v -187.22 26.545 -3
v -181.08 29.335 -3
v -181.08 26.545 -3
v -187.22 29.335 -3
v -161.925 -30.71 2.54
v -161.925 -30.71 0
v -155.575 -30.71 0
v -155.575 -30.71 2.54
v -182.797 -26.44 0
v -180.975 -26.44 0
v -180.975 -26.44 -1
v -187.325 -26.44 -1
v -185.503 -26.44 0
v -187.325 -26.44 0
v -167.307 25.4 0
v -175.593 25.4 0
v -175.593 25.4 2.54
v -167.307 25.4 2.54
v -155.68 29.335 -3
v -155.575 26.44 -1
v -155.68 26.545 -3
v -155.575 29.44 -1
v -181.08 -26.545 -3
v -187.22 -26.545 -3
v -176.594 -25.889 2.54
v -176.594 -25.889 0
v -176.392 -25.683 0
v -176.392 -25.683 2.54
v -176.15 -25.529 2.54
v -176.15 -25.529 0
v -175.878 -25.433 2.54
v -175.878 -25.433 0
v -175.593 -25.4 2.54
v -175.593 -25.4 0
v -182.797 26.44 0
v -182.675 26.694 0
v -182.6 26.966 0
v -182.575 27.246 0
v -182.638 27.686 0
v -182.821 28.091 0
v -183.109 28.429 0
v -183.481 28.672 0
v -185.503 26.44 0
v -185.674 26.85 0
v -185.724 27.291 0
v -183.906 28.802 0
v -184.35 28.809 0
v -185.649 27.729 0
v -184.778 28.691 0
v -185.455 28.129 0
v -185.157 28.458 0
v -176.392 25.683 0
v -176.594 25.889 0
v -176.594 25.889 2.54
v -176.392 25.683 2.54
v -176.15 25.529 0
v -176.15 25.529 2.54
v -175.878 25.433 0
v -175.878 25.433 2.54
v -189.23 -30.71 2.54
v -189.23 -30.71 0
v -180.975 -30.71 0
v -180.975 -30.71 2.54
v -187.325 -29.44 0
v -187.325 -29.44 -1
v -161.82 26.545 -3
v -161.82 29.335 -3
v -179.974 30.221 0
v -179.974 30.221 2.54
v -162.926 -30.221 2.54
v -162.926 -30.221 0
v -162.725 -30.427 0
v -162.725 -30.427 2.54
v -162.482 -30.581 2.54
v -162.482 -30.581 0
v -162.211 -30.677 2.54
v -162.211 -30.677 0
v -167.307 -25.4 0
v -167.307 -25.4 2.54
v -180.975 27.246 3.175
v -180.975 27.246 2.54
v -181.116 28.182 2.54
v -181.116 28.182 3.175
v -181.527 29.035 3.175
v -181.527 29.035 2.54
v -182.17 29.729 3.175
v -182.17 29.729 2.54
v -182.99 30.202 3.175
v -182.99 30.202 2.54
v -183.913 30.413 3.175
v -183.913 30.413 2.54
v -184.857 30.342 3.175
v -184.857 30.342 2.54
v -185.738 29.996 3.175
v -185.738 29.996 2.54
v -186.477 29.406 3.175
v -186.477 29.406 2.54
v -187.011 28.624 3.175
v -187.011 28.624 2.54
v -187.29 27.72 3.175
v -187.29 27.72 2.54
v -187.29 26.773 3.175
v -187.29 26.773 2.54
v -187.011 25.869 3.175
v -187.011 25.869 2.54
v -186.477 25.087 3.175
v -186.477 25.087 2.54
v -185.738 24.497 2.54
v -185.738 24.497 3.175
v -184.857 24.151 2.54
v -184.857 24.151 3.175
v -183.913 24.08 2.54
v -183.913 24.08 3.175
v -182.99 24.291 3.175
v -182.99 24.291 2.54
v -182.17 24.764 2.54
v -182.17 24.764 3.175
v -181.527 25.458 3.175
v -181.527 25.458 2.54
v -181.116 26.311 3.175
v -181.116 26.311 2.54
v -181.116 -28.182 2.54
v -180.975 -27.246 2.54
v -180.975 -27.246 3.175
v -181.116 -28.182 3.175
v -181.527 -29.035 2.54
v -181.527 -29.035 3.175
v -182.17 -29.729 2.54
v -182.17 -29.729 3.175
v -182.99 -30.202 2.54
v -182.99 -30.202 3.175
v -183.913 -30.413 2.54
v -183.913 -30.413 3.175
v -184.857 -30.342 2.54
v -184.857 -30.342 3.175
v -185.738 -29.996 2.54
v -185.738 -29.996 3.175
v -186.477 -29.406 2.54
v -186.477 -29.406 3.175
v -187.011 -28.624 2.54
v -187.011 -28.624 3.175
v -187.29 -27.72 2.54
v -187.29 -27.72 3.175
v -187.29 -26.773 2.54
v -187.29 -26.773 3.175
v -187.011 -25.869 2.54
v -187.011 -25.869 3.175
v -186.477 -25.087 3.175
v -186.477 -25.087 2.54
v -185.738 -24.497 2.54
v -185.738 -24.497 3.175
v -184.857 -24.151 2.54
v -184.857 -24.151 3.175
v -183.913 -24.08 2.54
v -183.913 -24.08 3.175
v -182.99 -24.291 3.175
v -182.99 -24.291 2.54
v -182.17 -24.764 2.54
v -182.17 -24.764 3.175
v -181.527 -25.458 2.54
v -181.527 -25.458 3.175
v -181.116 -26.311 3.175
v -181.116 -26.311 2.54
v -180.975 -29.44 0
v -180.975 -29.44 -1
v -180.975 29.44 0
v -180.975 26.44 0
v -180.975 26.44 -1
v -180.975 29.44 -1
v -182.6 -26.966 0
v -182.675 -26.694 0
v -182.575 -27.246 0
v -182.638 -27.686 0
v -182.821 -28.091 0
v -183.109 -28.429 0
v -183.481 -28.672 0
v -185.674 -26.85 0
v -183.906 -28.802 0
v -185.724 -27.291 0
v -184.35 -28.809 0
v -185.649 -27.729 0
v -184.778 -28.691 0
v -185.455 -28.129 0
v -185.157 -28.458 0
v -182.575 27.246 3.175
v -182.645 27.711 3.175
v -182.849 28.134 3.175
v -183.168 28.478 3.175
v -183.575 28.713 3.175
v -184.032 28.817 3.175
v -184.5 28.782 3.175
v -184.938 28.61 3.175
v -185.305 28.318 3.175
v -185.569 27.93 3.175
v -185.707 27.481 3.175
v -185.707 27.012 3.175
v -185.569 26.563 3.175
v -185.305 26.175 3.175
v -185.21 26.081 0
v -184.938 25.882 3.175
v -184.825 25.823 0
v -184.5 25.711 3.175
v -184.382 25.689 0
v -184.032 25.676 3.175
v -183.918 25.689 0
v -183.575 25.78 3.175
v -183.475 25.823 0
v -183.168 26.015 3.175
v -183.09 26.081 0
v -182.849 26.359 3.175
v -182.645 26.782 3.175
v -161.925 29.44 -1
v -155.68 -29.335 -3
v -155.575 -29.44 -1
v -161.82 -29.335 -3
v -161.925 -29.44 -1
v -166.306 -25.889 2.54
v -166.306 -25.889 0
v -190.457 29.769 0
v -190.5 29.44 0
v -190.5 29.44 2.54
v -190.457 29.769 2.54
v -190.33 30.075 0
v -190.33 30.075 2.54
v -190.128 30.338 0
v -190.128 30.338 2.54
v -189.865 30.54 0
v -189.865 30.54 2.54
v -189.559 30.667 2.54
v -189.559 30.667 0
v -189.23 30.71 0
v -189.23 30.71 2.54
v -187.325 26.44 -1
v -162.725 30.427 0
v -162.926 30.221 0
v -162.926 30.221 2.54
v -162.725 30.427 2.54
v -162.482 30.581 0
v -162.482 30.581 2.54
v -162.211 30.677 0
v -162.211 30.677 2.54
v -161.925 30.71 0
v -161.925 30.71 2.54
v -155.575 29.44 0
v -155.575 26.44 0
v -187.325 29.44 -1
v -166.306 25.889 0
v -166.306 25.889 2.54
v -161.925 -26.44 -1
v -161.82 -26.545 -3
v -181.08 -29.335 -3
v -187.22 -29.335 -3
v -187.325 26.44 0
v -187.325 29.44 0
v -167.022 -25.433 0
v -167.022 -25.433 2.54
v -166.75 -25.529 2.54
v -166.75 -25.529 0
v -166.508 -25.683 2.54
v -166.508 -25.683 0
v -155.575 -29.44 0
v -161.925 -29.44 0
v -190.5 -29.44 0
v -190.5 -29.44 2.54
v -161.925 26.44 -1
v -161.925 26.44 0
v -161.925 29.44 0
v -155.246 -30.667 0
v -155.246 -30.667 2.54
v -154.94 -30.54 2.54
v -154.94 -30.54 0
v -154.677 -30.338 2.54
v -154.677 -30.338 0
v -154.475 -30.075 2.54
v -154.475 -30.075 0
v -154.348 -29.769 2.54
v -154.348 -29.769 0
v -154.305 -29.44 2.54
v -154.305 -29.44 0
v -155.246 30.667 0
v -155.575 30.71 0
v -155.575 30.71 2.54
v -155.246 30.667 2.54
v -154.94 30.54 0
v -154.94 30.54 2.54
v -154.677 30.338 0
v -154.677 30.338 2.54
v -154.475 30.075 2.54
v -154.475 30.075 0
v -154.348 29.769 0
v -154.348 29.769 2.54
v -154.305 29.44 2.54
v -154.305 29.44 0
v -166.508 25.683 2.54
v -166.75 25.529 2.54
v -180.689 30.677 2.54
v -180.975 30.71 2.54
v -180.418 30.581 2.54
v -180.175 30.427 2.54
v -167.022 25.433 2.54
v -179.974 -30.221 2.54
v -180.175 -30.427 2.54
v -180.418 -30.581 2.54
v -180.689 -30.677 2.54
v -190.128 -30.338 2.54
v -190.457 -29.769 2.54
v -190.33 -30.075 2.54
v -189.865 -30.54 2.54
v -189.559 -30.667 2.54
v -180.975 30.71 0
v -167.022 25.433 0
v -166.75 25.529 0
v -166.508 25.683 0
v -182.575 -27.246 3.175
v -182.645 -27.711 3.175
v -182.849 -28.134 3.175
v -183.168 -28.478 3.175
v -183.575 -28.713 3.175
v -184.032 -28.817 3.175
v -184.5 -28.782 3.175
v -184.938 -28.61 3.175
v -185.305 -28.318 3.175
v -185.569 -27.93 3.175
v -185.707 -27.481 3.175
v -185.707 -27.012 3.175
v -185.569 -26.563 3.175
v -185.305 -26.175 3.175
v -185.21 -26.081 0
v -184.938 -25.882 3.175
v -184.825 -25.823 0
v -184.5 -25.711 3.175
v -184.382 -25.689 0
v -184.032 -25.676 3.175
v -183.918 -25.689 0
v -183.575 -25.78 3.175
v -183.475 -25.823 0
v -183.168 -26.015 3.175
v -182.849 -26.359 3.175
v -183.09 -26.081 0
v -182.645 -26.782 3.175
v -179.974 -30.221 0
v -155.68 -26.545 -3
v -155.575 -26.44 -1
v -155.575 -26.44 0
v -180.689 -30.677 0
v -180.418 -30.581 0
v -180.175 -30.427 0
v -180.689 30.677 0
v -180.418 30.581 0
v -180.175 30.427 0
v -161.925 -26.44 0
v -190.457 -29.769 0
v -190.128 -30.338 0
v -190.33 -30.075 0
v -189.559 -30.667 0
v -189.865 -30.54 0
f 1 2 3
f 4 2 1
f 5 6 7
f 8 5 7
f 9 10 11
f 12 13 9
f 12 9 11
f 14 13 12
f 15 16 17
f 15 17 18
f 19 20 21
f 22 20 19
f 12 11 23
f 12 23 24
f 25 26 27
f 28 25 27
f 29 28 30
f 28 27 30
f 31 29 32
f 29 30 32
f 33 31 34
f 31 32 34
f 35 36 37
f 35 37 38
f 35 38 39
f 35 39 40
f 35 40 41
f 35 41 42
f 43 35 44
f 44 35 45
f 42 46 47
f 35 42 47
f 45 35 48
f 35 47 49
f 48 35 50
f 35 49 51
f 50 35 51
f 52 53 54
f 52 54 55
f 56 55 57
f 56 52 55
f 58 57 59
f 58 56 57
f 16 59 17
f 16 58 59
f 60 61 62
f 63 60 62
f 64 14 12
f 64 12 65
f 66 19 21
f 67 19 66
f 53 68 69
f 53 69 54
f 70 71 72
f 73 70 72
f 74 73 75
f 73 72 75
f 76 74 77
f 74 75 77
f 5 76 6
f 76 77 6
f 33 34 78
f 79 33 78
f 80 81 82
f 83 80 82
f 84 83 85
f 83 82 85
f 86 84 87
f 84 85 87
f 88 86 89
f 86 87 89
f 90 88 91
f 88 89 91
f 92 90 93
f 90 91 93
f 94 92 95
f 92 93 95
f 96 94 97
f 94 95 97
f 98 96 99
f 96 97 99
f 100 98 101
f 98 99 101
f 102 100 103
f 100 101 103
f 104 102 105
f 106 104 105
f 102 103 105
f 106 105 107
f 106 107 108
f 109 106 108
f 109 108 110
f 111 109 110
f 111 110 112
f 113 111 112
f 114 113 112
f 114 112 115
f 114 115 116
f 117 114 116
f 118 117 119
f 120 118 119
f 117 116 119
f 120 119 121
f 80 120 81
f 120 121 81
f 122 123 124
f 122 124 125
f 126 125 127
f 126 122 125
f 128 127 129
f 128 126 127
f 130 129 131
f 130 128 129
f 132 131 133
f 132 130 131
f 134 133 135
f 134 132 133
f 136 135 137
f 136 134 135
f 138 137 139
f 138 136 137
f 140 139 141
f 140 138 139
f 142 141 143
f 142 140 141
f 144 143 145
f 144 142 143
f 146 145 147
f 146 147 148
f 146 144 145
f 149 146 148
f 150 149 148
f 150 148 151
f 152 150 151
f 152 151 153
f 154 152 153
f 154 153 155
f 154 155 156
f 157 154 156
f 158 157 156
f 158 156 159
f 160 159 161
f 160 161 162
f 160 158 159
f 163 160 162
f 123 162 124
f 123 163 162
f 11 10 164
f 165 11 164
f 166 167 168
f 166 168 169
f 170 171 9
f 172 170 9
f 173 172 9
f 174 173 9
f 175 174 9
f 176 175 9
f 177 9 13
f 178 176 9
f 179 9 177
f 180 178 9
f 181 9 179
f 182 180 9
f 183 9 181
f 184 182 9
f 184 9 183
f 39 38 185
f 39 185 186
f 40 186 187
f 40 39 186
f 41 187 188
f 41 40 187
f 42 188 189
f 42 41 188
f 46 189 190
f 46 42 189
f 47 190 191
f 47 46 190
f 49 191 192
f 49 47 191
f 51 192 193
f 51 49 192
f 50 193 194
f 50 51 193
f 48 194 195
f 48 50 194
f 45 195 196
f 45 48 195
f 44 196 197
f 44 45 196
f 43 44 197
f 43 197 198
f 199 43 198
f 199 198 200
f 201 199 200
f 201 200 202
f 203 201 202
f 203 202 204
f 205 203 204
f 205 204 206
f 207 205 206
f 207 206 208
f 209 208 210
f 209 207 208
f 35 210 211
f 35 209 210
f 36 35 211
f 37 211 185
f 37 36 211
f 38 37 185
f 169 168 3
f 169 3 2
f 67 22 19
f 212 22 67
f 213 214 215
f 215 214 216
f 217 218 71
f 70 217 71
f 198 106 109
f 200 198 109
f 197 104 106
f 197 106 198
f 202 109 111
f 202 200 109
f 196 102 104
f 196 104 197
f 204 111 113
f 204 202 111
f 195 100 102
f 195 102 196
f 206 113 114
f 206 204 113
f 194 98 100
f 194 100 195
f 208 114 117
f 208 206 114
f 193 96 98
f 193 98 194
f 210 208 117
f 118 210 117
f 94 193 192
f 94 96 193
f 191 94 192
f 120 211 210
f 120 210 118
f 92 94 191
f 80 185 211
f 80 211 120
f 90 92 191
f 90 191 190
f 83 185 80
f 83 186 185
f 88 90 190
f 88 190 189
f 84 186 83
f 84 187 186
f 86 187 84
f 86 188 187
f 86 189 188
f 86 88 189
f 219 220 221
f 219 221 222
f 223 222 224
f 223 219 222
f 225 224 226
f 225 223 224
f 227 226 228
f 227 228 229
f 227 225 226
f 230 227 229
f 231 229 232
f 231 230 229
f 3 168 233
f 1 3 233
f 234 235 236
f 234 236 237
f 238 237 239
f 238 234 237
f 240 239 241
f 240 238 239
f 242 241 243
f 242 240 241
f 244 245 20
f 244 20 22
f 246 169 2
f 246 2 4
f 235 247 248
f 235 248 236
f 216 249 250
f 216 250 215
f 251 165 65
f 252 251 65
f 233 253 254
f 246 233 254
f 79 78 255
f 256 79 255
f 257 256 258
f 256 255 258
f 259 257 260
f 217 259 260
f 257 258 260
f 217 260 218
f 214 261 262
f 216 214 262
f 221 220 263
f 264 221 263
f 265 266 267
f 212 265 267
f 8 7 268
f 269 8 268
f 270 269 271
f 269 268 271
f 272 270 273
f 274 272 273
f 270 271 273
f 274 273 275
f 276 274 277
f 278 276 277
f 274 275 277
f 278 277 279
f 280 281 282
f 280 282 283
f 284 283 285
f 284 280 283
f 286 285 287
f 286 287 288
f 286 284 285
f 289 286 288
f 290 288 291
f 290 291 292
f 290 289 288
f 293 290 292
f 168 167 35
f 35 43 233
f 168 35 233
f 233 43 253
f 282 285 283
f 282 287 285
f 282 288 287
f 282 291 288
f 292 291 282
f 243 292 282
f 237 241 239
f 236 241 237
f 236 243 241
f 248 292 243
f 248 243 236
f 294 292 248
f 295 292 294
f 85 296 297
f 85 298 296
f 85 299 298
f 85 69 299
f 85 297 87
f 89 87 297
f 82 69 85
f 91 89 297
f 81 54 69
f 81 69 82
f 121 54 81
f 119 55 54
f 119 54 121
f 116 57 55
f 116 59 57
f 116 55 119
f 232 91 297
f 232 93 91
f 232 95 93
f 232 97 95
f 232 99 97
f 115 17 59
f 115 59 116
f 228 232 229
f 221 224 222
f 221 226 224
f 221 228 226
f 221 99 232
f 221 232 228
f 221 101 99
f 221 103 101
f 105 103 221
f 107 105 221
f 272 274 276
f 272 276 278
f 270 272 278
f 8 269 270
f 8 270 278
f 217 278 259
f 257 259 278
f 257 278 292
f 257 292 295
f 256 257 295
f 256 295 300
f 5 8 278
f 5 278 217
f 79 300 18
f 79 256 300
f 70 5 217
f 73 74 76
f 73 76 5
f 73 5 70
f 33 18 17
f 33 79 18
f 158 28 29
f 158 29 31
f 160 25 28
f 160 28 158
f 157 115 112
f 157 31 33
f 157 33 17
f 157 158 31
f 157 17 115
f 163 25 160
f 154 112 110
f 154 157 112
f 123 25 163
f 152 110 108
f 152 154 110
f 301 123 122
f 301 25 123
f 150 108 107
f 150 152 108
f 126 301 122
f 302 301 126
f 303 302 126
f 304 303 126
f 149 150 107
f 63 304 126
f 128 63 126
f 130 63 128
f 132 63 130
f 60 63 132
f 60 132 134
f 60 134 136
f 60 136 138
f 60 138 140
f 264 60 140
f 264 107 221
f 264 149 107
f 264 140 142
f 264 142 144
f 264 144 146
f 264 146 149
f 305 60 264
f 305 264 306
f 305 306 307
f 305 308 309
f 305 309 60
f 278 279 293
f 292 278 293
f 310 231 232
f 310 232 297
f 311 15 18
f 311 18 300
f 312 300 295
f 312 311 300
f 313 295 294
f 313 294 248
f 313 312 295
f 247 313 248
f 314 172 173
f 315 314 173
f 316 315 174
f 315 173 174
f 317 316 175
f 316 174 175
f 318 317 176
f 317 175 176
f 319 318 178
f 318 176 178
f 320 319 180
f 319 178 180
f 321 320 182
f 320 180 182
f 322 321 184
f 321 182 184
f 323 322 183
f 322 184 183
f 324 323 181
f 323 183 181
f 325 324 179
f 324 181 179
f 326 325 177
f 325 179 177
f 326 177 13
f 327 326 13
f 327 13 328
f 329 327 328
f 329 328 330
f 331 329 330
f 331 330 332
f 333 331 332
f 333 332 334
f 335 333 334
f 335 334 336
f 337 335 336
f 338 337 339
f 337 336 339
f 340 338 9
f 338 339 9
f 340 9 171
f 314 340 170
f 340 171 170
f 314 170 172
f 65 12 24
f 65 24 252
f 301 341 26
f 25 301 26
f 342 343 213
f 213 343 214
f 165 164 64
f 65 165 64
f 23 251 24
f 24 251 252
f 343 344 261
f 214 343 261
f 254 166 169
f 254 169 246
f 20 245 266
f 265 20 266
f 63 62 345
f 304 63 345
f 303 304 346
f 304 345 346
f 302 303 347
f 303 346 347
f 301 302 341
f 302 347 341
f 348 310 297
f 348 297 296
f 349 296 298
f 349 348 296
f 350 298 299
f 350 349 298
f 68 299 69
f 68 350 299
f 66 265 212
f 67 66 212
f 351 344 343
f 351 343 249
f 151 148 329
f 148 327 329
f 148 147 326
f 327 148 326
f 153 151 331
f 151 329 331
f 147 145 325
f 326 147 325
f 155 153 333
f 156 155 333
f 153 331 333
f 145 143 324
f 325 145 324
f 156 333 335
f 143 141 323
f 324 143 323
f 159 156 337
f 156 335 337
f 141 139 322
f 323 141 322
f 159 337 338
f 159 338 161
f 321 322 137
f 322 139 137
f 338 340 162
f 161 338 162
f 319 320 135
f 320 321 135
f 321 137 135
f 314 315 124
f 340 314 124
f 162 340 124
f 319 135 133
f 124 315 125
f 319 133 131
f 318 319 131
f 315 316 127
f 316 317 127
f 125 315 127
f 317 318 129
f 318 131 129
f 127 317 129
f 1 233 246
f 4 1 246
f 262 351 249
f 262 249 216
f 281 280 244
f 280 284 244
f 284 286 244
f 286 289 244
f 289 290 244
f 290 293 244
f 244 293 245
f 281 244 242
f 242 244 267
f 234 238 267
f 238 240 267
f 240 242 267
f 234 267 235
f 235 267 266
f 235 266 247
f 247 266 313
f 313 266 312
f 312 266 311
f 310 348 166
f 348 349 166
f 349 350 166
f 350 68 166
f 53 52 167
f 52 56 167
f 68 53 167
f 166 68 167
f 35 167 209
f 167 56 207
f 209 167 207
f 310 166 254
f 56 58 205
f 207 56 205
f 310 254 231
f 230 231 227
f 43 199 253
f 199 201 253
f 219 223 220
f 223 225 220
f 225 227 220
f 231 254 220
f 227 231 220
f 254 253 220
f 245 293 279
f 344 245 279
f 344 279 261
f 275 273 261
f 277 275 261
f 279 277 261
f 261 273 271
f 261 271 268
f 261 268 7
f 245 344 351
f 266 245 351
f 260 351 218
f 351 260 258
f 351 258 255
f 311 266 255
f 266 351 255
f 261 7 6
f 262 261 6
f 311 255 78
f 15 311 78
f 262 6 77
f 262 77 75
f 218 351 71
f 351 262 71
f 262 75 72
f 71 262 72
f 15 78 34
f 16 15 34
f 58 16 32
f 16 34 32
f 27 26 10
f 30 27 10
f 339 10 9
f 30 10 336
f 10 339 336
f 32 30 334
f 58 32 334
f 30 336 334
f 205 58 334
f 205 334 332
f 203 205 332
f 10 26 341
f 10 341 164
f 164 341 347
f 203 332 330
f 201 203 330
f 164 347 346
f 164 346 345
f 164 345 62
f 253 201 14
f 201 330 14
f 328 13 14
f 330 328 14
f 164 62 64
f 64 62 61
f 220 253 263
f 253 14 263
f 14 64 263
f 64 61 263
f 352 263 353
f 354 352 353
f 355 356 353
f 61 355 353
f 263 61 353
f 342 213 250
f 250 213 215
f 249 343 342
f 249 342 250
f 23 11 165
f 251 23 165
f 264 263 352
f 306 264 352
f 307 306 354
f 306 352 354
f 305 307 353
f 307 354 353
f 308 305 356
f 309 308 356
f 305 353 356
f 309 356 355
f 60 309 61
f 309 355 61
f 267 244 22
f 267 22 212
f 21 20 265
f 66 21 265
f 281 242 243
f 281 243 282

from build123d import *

# Parameters (mm, degrees)
SKETCH1_R                     = 1.575
BOSS_EXTRUDE1_DEPTH           = 2.54
SKETCH2_R                     = 3.175
SKETCH2_R_2                   = 1.575
BOSS_EXTRUDE2_DEPTH           = 0.635
SKETCH3_W                     = 6.35
SKETCH3_H                     = 3
BOSS_EXTRUDE3_DEPTH           = 1
SKETCH4_W                     = 6.35
SKETCH4_H                     = 3
BOSS_EXTRUDE4_DEPTH           = 2
BOSS_EXTRUDE4_DRAFT           = 3
BOSS_EXTRUDE4_PROFILE_2_DEPTH = 2
BOSS_EXTRUDE4_PROFILE_2_DRAFT = 3


with BuildPart() as part:
    # Sketch1 → Boss-Extrude1 (new body)
    with BuildSketch(Plane.XY):
        with BuildLine():
            Line((-184.15, 30.71), (-180.975, 30.71))
            ThreePointArc((-180.975, 30.71), (-180.417860718, 30.58126939), (-179.973667703, 30.221174521))
            Line((-179.973667703, 30.221174521), (-176.593849938, 25.888825479))
            ThreePointArc((-176.593849938, 25.888825479), (-176.149656923, 25.52873061), (-175.592517642, 25.4))
            Line((-175.592517642, 25.4), (-167.307484897, 25.4))
            ThreePointArc((-167.307484897, 25.4), (-166.750344217, 25.528730053), (-166.306150062, 25.888825479))
            Line((-166.306150062, 25.888825479), (-162.926332297, 30.221174521))
            ThreePointArc((-162.926332297, 30.221174521), (-162.482139282, 30.58126939), (-161.925, 30.71))
            Line((-161.925, 30.71), (-155.575, 30.71))
            ThreePointArc((-155.575, 30.71), (-154.676974388, 30.338025612), (-154.305, 29.44))
            Line((-154.305, 29.44), (-154.305, 0))
            Line((-154.305, 0), (-190.5, 0))
            Line((-190.5, 0), (-190.5, 25.4))
            Line((-190.5, 25.4), (-190.5, 29.44))
            ThreePointArc((-190.5, 29.44), (-190.128025612, 30.338025612), (-189.23, 30.71))
            Line((-189.23, 30.71), (-184.15, 30.71))
        make_face()
        with Locations((-184.15, 27.24645)):
            Circle(SKETCH1_R, mode=Mode.SUBTRACT)
    extrude(amount=BOSS_EXTRUDE1_DEPTH)

    # Sketch2 → Boss-Extrude2 (add)
    with BuildSketch(Plane.XY.offset(2.54)):
        with Locations((-184.15, 27.24645)):
            Circle(SKETCH2_R)
        with Locations((-184.15, 27.24645)):
            Circle(SKETCH2_R_2, mode=Mode.SUBTRACT)
    extrude(amount=BOSS_EXTRUDE2_DEPTH)

    # Sketch3 → Boss-Extrude3 (add)
    with BuildSketch(Plane(origin=(0, 0, 0), x_dir=(-1, 0, 0), z_dir=(0, 0, -1))):
        with Locations((184.15, 27.94)):
            Rectangle(SKETCH3_W, SKETCH3_H)
        with Locations((158.75, 27.94)):
            Rectangle(SKETCH3_W, SKETCH3_H)
    extrude(amount=BOSS_EXTRUDE3_DEPTH)


with BuildPart() as boss_extrude4_tool:
    # Sketch4 → Boss-Extrude4 (with draft: the straight prism first)
    with BuildSketch(Plane(origin=(0, 0, -1), x_dir=(-1, 0, 0), z_dir=(0, 0, -1))):
        with Locations((184.15, 27.94)):
            Rectangle(SKETCH4_W, SKETCH4_H)
    extrude(amount=BOSS_EXTRUDE4_DEPTH)
    # Boss-Extrude4: the draft: its side faces are tilted about the plane it starts from
    boss_extrude4_sides = [boss_extrude4_tool.faces().sort_by_distance(p)[0] for p in [
        (-180.975, 27.94, -2),
        (-184.15, 26.44, -2),
        (-187.325, 27.94, -2),
        (-184.15, 29.44, -2),
    ]]
    draft(boss_extrude4_sides, Plane(origin=(0, 0, -1), x_dir=(-1, 0, 0), z_dir=(0, 0, -1)), BOSS_EXTRUDE4_DRAFT)


with BuildPart() as part_1:
    add(part.part)

    # Boss-Extrude4: add boss_extrude4_tool
    add(boss_extrude4_tool.part)


with BuildPart() as boss_extrude4_profile_2_tool:
    # Sketch4 → Boss-Extrude4 profile 2 (with draft: the straight prism first)
    with BuildSketch(Plane(origin=(0, 0, -1), x_dir=(-1, 0, 0), z_dir=(0, 0, -1))):
        with Locations((158.75, 27.94)):
            Rectangle(SKETCH4_W, SKETCH4_H)
    extrude(amount=BOSS_EXTRUDE4_PROFILE_2_DEPTH)
    # Boss-Extrude4 profile 2: the draft: its side faces are tilted about the plane it starts from
    boss_extrude4_profile_2_sides = [boss_extrude4_profile_2_tool.faces().sort_by_distance(p)[0] for p in [
        (-155.575, 27.94, -2),
        (-158.75, 26.44, -2),
        (-161.925, 27.94, -2),
        (-158.75, 29.44, -2),
    ]]
    draft(boss_extrude4_profile_2_sides, Plane(origin=(0, 0, -1), x_dir=(-1, 0, 0), z_dir=(0, 0, -1)), BOSS_EXTRUDE4_PROFILE_2_DRAFT)


with BuildPart() as part_2:
    add(part_1.part)

    # Boss-Extrude4 profile 2: add boss_extrude4_profile_2_tool
    add(boss_extrude4_profile_2_tool.part)

    # Mirror1: part across plane


with BuildPart() as part_3:
    add(part_2.part)
    add(part_2.part.mirror(Plane.ZX))


solid = part_3.part
